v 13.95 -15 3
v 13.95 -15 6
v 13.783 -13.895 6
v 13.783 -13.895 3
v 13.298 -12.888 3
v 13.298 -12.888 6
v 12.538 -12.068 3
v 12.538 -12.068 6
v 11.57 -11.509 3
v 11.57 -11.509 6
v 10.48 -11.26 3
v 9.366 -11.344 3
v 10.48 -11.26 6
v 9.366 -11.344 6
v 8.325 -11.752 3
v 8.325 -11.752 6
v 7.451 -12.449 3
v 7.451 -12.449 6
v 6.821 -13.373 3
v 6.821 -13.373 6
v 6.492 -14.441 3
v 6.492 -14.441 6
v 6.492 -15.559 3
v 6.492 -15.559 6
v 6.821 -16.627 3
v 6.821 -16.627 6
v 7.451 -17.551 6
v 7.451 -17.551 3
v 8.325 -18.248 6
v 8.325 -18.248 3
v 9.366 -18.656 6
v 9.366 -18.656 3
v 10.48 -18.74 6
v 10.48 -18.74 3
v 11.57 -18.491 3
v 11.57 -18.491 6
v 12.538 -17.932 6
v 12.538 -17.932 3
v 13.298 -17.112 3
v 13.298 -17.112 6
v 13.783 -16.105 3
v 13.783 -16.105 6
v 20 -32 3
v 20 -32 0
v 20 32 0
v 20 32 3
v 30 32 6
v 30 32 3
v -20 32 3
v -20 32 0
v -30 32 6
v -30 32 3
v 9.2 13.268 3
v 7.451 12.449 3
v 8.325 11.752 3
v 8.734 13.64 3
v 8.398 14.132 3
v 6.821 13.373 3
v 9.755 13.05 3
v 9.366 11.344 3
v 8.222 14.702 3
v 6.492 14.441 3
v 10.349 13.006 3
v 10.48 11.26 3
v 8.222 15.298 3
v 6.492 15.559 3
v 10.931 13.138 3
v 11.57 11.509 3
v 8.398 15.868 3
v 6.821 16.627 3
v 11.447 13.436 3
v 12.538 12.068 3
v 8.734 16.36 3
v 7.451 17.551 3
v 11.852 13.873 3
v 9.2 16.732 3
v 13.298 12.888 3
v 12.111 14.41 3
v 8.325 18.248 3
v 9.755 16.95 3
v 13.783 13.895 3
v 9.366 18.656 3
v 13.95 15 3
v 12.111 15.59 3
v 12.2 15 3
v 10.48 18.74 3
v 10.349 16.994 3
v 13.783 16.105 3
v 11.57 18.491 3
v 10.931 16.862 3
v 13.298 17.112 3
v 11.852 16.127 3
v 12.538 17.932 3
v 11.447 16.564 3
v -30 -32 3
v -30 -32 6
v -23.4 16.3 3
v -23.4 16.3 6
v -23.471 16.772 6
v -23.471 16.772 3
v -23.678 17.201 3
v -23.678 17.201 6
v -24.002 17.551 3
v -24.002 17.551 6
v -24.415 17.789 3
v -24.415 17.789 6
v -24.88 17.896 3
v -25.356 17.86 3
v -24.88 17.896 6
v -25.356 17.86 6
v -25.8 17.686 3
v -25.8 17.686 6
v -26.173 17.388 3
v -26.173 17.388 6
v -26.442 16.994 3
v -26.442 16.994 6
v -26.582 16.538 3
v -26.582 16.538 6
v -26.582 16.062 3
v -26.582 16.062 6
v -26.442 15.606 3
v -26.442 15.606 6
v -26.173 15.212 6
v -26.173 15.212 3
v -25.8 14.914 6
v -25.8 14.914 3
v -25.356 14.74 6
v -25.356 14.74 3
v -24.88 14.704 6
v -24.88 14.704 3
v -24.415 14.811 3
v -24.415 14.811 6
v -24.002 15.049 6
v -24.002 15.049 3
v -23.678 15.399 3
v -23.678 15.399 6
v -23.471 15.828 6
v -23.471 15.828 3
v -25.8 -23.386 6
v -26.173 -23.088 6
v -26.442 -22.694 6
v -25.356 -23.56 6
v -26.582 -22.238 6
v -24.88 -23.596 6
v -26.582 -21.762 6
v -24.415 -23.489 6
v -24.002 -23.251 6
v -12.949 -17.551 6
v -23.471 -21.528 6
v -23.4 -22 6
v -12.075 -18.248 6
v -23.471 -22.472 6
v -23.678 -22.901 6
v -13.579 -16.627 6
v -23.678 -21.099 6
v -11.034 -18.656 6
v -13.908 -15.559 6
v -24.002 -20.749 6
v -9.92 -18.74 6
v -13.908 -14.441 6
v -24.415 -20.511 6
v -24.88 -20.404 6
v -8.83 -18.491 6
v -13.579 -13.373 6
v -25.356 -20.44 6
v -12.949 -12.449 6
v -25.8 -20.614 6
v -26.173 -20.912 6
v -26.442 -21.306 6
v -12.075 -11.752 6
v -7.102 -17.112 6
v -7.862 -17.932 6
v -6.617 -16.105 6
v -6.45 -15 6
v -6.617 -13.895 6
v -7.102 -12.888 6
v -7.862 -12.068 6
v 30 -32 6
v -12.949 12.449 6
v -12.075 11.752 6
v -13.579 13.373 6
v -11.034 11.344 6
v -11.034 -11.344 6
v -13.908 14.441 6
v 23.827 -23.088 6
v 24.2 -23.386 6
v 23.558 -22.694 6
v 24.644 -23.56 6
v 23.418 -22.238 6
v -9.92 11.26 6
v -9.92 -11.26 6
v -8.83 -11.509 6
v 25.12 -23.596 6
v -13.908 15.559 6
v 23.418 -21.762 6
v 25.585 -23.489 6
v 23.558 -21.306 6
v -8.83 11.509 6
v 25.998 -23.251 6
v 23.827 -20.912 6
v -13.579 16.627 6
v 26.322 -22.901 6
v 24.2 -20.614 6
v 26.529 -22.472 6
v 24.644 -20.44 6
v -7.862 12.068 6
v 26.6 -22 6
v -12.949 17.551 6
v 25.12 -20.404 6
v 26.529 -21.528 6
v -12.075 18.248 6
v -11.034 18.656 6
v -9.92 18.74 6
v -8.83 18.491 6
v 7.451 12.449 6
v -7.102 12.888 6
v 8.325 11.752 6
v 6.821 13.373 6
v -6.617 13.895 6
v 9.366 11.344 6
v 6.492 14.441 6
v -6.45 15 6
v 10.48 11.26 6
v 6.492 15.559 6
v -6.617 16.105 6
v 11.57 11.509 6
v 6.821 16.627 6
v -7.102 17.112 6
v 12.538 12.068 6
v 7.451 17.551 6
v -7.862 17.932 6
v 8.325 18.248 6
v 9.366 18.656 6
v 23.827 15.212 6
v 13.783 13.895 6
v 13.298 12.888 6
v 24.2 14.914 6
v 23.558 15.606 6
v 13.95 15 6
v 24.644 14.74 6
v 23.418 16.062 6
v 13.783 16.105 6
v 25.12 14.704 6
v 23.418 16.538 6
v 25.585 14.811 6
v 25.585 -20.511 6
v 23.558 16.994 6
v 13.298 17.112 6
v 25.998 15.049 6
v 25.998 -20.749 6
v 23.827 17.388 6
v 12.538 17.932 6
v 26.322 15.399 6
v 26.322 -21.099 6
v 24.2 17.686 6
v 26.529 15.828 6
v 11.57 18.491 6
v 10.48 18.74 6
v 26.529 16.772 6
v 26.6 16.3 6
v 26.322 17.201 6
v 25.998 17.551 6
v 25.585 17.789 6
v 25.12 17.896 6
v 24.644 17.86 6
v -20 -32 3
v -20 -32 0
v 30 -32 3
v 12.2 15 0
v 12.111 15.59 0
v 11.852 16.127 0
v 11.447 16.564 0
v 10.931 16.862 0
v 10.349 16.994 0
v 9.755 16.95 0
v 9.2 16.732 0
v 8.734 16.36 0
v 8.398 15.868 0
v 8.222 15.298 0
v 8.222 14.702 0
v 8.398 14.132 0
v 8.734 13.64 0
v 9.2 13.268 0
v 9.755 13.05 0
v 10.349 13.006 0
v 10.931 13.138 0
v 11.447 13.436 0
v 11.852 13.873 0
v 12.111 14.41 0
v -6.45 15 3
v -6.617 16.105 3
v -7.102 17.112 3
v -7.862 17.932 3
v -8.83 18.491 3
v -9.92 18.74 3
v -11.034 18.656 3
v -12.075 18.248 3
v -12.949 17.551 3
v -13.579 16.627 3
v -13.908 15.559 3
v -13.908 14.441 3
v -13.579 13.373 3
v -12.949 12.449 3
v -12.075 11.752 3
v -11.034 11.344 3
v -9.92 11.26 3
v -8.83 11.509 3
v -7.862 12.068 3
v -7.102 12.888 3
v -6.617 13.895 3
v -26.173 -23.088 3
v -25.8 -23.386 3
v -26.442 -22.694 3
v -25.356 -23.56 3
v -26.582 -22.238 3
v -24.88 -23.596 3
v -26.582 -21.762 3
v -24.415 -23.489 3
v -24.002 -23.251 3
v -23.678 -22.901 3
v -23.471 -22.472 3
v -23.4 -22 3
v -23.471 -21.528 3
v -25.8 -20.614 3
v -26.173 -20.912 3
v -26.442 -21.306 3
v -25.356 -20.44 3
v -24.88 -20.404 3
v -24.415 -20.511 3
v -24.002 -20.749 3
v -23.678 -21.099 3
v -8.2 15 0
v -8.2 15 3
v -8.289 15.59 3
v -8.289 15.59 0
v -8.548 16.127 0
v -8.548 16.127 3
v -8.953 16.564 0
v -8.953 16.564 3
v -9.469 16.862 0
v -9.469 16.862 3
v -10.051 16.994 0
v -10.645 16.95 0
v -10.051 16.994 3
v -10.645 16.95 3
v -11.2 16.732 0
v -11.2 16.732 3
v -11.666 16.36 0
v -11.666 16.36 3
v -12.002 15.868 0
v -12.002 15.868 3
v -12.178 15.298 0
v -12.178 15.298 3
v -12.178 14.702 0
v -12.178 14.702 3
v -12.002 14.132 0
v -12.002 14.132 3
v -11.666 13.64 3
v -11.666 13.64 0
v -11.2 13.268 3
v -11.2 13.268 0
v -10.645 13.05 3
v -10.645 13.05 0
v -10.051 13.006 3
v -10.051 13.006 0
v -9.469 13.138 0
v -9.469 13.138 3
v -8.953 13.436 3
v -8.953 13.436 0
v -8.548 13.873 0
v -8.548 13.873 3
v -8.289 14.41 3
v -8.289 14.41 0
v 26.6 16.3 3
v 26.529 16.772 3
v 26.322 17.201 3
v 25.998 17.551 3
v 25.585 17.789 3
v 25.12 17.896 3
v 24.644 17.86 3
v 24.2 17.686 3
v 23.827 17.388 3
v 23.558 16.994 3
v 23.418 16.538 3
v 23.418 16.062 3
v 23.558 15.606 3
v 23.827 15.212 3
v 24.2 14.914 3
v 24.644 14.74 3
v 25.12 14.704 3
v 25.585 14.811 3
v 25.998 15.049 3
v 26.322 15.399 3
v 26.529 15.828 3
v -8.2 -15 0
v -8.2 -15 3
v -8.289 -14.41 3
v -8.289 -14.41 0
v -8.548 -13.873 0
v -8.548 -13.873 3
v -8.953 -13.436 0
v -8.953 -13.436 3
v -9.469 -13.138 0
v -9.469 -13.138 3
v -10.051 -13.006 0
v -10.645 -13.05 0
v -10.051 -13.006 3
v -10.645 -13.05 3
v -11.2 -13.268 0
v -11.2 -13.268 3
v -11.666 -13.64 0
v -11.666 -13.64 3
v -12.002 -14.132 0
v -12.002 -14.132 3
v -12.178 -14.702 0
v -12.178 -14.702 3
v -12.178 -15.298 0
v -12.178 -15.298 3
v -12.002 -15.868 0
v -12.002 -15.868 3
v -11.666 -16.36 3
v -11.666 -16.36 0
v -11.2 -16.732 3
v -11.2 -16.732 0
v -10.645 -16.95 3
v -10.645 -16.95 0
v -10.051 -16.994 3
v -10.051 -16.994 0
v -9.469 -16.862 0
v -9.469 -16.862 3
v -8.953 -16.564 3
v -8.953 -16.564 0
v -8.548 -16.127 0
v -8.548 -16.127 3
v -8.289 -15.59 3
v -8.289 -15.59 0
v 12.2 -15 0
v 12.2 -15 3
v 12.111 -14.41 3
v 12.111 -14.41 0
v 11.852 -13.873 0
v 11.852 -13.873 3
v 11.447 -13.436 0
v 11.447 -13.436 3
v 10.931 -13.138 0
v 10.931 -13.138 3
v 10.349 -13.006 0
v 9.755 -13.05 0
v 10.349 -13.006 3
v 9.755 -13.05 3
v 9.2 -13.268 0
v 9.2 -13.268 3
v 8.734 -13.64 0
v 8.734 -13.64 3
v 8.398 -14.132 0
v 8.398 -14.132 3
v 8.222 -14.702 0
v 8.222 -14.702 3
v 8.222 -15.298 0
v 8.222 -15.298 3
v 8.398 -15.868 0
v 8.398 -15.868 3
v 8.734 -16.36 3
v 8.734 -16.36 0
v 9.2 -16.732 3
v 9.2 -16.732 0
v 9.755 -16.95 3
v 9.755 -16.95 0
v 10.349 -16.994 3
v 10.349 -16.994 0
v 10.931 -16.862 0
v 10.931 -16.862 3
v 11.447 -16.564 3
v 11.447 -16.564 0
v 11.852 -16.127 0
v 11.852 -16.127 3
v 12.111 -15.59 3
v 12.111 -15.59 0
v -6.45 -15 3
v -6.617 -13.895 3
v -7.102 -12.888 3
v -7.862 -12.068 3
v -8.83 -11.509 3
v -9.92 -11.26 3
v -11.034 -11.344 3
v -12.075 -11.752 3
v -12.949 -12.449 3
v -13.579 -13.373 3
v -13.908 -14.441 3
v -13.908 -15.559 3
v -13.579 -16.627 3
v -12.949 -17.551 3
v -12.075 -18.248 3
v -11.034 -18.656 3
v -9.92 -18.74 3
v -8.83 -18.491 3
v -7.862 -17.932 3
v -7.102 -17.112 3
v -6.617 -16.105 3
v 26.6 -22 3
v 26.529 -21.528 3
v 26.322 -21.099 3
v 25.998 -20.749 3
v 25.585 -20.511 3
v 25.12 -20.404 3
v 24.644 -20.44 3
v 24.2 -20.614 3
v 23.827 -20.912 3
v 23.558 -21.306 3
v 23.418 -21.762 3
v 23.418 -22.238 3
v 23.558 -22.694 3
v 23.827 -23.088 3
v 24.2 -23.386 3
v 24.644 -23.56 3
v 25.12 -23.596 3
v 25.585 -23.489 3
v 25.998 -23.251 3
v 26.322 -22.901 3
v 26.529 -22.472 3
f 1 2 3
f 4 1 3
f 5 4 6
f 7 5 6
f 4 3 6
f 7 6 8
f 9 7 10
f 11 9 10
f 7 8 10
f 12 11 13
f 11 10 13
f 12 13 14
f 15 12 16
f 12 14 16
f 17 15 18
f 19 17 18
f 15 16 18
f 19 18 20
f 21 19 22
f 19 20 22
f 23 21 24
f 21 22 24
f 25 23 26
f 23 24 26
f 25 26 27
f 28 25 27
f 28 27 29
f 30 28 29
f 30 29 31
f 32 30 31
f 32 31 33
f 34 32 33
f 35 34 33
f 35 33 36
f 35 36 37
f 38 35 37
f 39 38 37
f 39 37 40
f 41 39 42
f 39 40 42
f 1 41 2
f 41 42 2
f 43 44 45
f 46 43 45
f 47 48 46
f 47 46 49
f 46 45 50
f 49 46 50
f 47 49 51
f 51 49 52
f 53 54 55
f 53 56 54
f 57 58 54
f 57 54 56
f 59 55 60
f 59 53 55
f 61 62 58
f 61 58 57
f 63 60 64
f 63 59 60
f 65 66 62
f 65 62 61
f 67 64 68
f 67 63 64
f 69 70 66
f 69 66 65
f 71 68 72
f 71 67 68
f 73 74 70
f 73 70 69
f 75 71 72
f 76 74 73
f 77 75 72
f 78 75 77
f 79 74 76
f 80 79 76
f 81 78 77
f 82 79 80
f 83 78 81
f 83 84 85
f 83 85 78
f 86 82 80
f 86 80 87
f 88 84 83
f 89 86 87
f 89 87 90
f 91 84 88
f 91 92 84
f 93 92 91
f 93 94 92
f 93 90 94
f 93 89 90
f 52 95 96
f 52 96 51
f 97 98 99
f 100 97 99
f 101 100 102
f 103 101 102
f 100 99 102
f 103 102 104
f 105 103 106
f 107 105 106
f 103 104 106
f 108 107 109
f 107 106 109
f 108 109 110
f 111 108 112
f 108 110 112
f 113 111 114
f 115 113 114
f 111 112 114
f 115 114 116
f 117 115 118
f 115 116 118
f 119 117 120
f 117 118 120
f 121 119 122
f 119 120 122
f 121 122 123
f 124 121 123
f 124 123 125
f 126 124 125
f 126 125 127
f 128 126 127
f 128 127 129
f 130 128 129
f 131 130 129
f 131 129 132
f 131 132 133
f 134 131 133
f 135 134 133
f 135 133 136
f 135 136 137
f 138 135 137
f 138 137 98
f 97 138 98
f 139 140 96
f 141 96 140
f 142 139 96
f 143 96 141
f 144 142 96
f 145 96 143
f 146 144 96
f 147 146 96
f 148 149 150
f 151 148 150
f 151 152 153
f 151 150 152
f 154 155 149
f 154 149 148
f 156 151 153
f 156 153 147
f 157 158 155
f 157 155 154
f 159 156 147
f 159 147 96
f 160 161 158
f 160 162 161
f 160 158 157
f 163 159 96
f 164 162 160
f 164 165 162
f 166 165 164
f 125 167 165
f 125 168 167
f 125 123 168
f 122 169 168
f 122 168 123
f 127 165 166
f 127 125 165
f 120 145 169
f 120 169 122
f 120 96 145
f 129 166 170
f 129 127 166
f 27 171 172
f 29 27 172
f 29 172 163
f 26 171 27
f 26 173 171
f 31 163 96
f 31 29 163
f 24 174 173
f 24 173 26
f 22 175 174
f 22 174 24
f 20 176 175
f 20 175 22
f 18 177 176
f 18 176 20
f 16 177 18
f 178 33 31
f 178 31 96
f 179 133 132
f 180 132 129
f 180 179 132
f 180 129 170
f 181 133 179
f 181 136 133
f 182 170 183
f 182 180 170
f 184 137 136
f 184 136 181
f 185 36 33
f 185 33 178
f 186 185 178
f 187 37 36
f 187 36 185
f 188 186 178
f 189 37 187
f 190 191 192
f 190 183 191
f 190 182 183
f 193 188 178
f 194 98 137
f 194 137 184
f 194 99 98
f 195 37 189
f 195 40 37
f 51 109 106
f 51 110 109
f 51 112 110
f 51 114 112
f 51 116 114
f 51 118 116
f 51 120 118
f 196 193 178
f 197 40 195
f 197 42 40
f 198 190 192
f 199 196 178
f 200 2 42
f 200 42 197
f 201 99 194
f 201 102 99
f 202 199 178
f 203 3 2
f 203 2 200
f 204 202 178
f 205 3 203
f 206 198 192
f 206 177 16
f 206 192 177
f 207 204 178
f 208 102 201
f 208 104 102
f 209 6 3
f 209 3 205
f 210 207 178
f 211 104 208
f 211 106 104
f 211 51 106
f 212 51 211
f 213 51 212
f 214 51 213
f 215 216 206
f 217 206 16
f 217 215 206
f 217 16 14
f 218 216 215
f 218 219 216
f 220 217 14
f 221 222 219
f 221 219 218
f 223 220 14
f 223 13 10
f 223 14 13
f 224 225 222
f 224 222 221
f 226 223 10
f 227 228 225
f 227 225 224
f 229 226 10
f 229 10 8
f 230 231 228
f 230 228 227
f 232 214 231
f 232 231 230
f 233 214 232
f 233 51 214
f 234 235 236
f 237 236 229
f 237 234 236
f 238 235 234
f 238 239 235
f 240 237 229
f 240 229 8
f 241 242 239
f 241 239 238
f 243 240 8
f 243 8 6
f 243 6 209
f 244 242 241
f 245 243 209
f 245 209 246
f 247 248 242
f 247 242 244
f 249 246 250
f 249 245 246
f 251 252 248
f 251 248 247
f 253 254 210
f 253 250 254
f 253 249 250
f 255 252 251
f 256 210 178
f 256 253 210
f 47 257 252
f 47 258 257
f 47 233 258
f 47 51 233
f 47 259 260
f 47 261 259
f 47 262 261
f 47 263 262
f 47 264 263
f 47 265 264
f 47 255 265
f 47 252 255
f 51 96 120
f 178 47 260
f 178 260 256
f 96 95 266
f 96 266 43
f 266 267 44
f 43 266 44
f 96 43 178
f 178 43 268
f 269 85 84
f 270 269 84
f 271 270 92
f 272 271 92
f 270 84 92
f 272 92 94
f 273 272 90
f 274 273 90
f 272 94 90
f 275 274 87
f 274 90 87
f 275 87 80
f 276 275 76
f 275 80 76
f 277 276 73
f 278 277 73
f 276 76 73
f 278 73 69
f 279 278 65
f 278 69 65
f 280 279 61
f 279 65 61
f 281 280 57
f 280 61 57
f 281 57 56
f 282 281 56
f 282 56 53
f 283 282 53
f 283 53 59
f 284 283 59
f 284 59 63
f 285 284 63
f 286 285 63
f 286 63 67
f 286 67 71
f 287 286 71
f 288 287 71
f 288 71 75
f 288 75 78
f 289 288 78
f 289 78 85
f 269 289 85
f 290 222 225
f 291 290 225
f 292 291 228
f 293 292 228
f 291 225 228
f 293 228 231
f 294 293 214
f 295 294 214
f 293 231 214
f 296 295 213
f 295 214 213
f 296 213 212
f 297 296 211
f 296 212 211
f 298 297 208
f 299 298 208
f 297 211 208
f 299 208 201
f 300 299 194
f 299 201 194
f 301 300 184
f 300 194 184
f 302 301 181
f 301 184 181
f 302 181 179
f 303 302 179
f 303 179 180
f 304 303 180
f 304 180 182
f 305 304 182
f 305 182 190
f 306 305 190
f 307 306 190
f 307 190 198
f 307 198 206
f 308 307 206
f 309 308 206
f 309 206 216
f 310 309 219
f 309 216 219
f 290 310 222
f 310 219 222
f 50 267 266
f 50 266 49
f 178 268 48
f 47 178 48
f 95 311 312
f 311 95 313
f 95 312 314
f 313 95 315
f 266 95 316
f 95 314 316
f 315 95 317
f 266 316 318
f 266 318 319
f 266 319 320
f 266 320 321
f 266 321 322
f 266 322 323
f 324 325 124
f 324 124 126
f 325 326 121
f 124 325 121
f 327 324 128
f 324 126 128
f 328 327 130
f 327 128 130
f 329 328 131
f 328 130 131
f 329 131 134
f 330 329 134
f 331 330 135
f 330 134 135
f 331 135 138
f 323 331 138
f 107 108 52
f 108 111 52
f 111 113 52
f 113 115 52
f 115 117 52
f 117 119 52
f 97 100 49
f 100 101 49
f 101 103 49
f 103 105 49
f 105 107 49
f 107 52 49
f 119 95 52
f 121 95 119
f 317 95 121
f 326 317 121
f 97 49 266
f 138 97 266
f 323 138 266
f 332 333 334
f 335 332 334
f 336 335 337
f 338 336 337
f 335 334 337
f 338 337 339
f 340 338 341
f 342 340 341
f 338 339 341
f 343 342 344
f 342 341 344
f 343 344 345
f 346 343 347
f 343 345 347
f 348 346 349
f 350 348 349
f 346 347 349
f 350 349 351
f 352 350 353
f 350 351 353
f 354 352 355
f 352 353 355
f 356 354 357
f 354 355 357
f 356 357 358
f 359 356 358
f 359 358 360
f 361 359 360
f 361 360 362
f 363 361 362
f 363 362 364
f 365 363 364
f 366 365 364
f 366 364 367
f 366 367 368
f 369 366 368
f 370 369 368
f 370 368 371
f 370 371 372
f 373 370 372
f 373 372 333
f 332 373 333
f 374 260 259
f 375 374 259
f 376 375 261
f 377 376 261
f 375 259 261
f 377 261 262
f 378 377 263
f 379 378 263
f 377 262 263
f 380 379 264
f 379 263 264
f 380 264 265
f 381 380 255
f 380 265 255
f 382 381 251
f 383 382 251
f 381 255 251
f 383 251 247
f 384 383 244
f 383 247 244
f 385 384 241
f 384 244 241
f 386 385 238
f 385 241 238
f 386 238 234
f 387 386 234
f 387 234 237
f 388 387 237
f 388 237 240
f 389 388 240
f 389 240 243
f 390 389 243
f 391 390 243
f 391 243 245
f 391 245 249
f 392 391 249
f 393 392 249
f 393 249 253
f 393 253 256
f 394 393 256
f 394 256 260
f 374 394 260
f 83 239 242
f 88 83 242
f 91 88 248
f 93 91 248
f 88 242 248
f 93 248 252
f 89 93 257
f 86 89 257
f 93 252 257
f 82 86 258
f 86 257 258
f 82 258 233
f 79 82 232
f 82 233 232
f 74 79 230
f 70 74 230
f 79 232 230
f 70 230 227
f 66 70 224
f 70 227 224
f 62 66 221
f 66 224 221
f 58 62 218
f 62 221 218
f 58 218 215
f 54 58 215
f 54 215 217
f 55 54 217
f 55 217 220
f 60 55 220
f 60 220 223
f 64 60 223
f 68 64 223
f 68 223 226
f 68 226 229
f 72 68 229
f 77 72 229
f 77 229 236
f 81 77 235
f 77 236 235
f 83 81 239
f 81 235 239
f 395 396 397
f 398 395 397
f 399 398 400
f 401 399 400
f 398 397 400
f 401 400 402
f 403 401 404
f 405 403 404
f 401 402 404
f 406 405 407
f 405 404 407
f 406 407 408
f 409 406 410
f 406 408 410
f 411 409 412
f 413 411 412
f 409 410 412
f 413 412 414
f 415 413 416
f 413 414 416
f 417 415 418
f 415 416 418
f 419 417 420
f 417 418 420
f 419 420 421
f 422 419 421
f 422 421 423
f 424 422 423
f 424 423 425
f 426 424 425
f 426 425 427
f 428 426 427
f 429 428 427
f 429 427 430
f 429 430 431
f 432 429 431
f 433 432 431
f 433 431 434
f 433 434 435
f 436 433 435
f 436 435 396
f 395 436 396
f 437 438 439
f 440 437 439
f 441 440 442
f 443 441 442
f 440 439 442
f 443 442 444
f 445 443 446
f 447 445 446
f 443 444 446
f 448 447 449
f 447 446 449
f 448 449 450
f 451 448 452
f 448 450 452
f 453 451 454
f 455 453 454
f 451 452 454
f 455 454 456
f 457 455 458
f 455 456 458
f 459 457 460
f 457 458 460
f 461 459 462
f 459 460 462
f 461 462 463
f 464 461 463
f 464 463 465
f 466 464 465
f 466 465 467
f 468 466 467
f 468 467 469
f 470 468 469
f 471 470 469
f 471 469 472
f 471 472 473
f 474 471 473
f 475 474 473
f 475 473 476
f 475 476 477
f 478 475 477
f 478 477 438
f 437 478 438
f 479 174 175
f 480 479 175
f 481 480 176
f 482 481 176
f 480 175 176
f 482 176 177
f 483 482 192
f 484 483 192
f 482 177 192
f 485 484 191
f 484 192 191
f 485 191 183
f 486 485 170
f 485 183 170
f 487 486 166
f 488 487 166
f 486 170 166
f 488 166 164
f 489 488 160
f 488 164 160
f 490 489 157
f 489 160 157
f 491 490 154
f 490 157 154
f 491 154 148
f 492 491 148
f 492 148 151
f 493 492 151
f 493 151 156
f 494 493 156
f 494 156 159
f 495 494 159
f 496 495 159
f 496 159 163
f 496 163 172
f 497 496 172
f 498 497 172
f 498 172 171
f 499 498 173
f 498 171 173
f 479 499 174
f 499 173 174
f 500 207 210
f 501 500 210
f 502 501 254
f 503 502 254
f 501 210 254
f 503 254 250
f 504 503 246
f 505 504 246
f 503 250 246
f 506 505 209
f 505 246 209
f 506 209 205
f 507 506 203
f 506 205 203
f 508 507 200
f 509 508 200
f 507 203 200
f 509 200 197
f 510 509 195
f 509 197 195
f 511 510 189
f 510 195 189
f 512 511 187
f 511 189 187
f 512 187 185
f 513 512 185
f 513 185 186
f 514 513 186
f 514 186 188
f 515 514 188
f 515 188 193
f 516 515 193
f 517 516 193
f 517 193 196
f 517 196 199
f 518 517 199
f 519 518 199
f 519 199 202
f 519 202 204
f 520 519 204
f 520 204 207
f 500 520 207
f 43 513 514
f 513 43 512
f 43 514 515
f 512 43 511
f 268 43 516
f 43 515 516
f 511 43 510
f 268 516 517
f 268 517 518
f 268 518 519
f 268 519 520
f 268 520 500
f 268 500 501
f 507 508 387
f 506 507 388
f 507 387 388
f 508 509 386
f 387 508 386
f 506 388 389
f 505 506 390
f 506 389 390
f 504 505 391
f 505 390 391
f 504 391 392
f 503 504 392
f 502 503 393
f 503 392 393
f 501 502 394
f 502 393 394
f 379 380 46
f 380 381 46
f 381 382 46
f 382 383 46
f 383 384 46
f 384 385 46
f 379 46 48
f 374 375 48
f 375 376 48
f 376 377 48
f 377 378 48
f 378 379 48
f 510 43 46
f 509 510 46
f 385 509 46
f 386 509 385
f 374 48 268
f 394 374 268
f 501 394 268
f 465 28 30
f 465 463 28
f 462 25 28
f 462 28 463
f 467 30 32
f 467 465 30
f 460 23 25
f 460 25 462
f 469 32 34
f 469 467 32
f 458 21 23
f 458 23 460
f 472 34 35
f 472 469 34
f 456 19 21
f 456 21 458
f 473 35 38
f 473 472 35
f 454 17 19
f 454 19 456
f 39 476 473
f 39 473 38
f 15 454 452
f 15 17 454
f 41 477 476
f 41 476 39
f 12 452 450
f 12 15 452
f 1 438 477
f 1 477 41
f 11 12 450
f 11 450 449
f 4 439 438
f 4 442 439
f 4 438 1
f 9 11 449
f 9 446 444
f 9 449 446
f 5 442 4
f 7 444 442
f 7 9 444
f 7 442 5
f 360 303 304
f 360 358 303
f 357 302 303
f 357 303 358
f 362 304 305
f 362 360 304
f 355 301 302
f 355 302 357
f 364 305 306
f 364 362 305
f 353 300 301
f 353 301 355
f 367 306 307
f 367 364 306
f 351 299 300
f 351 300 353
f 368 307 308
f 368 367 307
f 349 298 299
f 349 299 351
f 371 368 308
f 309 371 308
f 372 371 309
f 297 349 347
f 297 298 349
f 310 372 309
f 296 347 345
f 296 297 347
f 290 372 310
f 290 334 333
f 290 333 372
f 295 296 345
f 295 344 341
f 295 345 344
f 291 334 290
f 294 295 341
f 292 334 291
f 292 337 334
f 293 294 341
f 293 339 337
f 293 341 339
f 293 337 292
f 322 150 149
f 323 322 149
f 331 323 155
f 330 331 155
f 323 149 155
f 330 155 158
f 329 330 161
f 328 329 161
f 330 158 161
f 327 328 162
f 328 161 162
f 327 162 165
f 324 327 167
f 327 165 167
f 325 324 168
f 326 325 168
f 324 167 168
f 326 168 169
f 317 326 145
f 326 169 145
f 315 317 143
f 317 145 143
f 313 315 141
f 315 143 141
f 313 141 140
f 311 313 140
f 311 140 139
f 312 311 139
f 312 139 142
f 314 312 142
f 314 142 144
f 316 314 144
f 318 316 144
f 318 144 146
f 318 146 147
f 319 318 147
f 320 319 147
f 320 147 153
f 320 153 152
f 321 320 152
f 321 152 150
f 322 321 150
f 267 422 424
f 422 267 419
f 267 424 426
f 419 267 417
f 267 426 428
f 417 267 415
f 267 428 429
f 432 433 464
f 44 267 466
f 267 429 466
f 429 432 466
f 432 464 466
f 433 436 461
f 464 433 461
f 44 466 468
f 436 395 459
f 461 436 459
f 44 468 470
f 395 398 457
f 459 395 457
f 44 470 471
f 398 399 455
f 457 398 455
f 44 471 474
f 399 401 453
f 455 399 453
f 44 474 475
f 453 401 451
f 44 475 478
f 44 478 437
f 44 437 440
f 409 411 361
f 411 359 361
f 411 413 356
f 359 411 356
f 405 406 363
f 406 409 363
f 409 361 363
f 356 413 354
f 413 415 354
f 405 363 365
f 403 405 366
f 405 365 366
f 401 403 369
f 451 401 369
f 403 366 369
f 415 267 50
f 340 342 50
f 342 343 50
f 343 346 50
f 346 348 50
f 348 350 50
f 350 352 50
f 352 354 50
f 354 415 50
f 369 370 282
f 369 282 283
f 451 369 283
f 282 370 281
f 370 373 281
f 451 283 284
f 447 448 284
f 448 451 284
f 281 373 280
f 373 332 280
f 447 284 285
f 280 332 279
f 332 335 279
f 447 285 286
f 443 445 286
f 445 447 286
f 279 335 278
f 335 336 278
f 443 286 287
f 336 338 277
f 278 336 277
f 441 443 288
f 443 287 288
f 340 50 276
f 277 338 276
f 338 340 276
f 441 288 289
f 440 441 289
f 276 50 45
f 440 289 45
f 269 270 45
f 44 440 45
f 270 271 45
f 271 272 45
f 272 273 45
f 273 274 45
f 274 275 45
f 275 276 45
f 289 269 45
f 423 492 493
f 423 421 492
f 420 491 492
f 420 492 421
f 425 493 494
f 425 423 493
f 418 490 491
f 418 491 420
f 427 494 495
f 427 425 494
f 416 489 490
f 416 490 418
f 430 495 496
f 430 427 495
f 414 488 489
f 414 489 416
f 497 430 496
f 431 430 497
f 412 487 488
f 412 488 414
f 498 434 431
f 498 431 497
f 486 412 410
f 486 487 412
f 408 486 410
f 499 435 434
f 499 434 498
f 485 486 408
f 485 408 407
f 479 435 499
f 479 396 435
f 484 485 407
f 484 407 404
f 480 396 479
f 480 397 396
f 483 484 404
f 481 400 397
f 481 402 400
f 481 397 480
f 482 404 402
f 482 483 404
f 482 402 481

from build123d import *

# Parameters (mm, degrees)
F0_W      = 40
F0_H      = 64
F1_DEPTH  = 3
F2_W      = 10
F2_H      = 64
F2_W_2    = 40
F3_DEPTH  = 3
F4_R      = 1.6
F5_DEPTH  = 25
F6_R      = 1.6
F7_DEPTH  = 25
F8_R      = 3.75
F9_DEPTH  = 3
F10_R     = 2
F11_DEPTH = 25


with BuildPart() as f1:
    # F0 (on Top) → F1 (new body)
    with BuildSketch(Plane.XY):
        Rectangle(F0_W, F0_H)
    extrude(amount=F1_DEPTH)

    # F2 (on face) → F3 (join)
    with BuildSketch(Plane.XY.offset(3)):
        with Locations((-25, 0)):
            Rectangle(F2_W, F2_H)
        Rectangle(F2_W_2, F2_H)
        with Locations((25, 0)):
            Rectangle(F2_W, F2_H)
    extrude(amount=F3_DEPTH)

    # F4 (on face) → F5 (cut)
    with BuildSketch(Plane.XY.offset(6)):
        with Locations((-25, 16.3)):
            Circle(F4_R)
    extrude(amount=-F5_DEPTH, mode=Mode.SUBTRACT)

    # F6 (on face) → F7 (cut)
    with BuildSketch(Plane.XY.offset(6)):
        with Locations((-25, -22)):
            Circle(F6_R)
        with Locations((25, -22)):
            Circle(F6_R)
        with Locations((25, 16.3)):
            Circle(F6_R)
    extrude(amount=-F7_DEPTH, mode=Mode.SUBTRACT)

    # F8 (on face) → F9 (cut)
    with BuildSketch(Plane.XY.offset(6)):
        with Locations((-10.2, -15)):
            Circle(F8_R)
        with Locations((10.2, -15)):
            Circle(F8_R)
        with Locations((10.2, 15)):
            Circle(F8_R)
        with Locations((-10.2, 15)):
            Circle(F8_R)
    extrude(amount=-F9_DEPTH, mode=Mode.SUBTRACT)

    # F10 (on face) → F11 (cut)
    with BuildSketch(Plane.XY.offset(3)):
        with Locations((-10.2, -15)):
            Circle(F10_R)
        with Locations((-10.2, 15)):
            Circle(F10_R)
        with Locations((10.2, 15)):
            Circle(F10_R)
        with Locations((10.2, -15)):
            Circle(F10_R)
    extrude(amount=-F11_DEPTH, mode=Mode.SUBTRACT)


solid = f1.part
